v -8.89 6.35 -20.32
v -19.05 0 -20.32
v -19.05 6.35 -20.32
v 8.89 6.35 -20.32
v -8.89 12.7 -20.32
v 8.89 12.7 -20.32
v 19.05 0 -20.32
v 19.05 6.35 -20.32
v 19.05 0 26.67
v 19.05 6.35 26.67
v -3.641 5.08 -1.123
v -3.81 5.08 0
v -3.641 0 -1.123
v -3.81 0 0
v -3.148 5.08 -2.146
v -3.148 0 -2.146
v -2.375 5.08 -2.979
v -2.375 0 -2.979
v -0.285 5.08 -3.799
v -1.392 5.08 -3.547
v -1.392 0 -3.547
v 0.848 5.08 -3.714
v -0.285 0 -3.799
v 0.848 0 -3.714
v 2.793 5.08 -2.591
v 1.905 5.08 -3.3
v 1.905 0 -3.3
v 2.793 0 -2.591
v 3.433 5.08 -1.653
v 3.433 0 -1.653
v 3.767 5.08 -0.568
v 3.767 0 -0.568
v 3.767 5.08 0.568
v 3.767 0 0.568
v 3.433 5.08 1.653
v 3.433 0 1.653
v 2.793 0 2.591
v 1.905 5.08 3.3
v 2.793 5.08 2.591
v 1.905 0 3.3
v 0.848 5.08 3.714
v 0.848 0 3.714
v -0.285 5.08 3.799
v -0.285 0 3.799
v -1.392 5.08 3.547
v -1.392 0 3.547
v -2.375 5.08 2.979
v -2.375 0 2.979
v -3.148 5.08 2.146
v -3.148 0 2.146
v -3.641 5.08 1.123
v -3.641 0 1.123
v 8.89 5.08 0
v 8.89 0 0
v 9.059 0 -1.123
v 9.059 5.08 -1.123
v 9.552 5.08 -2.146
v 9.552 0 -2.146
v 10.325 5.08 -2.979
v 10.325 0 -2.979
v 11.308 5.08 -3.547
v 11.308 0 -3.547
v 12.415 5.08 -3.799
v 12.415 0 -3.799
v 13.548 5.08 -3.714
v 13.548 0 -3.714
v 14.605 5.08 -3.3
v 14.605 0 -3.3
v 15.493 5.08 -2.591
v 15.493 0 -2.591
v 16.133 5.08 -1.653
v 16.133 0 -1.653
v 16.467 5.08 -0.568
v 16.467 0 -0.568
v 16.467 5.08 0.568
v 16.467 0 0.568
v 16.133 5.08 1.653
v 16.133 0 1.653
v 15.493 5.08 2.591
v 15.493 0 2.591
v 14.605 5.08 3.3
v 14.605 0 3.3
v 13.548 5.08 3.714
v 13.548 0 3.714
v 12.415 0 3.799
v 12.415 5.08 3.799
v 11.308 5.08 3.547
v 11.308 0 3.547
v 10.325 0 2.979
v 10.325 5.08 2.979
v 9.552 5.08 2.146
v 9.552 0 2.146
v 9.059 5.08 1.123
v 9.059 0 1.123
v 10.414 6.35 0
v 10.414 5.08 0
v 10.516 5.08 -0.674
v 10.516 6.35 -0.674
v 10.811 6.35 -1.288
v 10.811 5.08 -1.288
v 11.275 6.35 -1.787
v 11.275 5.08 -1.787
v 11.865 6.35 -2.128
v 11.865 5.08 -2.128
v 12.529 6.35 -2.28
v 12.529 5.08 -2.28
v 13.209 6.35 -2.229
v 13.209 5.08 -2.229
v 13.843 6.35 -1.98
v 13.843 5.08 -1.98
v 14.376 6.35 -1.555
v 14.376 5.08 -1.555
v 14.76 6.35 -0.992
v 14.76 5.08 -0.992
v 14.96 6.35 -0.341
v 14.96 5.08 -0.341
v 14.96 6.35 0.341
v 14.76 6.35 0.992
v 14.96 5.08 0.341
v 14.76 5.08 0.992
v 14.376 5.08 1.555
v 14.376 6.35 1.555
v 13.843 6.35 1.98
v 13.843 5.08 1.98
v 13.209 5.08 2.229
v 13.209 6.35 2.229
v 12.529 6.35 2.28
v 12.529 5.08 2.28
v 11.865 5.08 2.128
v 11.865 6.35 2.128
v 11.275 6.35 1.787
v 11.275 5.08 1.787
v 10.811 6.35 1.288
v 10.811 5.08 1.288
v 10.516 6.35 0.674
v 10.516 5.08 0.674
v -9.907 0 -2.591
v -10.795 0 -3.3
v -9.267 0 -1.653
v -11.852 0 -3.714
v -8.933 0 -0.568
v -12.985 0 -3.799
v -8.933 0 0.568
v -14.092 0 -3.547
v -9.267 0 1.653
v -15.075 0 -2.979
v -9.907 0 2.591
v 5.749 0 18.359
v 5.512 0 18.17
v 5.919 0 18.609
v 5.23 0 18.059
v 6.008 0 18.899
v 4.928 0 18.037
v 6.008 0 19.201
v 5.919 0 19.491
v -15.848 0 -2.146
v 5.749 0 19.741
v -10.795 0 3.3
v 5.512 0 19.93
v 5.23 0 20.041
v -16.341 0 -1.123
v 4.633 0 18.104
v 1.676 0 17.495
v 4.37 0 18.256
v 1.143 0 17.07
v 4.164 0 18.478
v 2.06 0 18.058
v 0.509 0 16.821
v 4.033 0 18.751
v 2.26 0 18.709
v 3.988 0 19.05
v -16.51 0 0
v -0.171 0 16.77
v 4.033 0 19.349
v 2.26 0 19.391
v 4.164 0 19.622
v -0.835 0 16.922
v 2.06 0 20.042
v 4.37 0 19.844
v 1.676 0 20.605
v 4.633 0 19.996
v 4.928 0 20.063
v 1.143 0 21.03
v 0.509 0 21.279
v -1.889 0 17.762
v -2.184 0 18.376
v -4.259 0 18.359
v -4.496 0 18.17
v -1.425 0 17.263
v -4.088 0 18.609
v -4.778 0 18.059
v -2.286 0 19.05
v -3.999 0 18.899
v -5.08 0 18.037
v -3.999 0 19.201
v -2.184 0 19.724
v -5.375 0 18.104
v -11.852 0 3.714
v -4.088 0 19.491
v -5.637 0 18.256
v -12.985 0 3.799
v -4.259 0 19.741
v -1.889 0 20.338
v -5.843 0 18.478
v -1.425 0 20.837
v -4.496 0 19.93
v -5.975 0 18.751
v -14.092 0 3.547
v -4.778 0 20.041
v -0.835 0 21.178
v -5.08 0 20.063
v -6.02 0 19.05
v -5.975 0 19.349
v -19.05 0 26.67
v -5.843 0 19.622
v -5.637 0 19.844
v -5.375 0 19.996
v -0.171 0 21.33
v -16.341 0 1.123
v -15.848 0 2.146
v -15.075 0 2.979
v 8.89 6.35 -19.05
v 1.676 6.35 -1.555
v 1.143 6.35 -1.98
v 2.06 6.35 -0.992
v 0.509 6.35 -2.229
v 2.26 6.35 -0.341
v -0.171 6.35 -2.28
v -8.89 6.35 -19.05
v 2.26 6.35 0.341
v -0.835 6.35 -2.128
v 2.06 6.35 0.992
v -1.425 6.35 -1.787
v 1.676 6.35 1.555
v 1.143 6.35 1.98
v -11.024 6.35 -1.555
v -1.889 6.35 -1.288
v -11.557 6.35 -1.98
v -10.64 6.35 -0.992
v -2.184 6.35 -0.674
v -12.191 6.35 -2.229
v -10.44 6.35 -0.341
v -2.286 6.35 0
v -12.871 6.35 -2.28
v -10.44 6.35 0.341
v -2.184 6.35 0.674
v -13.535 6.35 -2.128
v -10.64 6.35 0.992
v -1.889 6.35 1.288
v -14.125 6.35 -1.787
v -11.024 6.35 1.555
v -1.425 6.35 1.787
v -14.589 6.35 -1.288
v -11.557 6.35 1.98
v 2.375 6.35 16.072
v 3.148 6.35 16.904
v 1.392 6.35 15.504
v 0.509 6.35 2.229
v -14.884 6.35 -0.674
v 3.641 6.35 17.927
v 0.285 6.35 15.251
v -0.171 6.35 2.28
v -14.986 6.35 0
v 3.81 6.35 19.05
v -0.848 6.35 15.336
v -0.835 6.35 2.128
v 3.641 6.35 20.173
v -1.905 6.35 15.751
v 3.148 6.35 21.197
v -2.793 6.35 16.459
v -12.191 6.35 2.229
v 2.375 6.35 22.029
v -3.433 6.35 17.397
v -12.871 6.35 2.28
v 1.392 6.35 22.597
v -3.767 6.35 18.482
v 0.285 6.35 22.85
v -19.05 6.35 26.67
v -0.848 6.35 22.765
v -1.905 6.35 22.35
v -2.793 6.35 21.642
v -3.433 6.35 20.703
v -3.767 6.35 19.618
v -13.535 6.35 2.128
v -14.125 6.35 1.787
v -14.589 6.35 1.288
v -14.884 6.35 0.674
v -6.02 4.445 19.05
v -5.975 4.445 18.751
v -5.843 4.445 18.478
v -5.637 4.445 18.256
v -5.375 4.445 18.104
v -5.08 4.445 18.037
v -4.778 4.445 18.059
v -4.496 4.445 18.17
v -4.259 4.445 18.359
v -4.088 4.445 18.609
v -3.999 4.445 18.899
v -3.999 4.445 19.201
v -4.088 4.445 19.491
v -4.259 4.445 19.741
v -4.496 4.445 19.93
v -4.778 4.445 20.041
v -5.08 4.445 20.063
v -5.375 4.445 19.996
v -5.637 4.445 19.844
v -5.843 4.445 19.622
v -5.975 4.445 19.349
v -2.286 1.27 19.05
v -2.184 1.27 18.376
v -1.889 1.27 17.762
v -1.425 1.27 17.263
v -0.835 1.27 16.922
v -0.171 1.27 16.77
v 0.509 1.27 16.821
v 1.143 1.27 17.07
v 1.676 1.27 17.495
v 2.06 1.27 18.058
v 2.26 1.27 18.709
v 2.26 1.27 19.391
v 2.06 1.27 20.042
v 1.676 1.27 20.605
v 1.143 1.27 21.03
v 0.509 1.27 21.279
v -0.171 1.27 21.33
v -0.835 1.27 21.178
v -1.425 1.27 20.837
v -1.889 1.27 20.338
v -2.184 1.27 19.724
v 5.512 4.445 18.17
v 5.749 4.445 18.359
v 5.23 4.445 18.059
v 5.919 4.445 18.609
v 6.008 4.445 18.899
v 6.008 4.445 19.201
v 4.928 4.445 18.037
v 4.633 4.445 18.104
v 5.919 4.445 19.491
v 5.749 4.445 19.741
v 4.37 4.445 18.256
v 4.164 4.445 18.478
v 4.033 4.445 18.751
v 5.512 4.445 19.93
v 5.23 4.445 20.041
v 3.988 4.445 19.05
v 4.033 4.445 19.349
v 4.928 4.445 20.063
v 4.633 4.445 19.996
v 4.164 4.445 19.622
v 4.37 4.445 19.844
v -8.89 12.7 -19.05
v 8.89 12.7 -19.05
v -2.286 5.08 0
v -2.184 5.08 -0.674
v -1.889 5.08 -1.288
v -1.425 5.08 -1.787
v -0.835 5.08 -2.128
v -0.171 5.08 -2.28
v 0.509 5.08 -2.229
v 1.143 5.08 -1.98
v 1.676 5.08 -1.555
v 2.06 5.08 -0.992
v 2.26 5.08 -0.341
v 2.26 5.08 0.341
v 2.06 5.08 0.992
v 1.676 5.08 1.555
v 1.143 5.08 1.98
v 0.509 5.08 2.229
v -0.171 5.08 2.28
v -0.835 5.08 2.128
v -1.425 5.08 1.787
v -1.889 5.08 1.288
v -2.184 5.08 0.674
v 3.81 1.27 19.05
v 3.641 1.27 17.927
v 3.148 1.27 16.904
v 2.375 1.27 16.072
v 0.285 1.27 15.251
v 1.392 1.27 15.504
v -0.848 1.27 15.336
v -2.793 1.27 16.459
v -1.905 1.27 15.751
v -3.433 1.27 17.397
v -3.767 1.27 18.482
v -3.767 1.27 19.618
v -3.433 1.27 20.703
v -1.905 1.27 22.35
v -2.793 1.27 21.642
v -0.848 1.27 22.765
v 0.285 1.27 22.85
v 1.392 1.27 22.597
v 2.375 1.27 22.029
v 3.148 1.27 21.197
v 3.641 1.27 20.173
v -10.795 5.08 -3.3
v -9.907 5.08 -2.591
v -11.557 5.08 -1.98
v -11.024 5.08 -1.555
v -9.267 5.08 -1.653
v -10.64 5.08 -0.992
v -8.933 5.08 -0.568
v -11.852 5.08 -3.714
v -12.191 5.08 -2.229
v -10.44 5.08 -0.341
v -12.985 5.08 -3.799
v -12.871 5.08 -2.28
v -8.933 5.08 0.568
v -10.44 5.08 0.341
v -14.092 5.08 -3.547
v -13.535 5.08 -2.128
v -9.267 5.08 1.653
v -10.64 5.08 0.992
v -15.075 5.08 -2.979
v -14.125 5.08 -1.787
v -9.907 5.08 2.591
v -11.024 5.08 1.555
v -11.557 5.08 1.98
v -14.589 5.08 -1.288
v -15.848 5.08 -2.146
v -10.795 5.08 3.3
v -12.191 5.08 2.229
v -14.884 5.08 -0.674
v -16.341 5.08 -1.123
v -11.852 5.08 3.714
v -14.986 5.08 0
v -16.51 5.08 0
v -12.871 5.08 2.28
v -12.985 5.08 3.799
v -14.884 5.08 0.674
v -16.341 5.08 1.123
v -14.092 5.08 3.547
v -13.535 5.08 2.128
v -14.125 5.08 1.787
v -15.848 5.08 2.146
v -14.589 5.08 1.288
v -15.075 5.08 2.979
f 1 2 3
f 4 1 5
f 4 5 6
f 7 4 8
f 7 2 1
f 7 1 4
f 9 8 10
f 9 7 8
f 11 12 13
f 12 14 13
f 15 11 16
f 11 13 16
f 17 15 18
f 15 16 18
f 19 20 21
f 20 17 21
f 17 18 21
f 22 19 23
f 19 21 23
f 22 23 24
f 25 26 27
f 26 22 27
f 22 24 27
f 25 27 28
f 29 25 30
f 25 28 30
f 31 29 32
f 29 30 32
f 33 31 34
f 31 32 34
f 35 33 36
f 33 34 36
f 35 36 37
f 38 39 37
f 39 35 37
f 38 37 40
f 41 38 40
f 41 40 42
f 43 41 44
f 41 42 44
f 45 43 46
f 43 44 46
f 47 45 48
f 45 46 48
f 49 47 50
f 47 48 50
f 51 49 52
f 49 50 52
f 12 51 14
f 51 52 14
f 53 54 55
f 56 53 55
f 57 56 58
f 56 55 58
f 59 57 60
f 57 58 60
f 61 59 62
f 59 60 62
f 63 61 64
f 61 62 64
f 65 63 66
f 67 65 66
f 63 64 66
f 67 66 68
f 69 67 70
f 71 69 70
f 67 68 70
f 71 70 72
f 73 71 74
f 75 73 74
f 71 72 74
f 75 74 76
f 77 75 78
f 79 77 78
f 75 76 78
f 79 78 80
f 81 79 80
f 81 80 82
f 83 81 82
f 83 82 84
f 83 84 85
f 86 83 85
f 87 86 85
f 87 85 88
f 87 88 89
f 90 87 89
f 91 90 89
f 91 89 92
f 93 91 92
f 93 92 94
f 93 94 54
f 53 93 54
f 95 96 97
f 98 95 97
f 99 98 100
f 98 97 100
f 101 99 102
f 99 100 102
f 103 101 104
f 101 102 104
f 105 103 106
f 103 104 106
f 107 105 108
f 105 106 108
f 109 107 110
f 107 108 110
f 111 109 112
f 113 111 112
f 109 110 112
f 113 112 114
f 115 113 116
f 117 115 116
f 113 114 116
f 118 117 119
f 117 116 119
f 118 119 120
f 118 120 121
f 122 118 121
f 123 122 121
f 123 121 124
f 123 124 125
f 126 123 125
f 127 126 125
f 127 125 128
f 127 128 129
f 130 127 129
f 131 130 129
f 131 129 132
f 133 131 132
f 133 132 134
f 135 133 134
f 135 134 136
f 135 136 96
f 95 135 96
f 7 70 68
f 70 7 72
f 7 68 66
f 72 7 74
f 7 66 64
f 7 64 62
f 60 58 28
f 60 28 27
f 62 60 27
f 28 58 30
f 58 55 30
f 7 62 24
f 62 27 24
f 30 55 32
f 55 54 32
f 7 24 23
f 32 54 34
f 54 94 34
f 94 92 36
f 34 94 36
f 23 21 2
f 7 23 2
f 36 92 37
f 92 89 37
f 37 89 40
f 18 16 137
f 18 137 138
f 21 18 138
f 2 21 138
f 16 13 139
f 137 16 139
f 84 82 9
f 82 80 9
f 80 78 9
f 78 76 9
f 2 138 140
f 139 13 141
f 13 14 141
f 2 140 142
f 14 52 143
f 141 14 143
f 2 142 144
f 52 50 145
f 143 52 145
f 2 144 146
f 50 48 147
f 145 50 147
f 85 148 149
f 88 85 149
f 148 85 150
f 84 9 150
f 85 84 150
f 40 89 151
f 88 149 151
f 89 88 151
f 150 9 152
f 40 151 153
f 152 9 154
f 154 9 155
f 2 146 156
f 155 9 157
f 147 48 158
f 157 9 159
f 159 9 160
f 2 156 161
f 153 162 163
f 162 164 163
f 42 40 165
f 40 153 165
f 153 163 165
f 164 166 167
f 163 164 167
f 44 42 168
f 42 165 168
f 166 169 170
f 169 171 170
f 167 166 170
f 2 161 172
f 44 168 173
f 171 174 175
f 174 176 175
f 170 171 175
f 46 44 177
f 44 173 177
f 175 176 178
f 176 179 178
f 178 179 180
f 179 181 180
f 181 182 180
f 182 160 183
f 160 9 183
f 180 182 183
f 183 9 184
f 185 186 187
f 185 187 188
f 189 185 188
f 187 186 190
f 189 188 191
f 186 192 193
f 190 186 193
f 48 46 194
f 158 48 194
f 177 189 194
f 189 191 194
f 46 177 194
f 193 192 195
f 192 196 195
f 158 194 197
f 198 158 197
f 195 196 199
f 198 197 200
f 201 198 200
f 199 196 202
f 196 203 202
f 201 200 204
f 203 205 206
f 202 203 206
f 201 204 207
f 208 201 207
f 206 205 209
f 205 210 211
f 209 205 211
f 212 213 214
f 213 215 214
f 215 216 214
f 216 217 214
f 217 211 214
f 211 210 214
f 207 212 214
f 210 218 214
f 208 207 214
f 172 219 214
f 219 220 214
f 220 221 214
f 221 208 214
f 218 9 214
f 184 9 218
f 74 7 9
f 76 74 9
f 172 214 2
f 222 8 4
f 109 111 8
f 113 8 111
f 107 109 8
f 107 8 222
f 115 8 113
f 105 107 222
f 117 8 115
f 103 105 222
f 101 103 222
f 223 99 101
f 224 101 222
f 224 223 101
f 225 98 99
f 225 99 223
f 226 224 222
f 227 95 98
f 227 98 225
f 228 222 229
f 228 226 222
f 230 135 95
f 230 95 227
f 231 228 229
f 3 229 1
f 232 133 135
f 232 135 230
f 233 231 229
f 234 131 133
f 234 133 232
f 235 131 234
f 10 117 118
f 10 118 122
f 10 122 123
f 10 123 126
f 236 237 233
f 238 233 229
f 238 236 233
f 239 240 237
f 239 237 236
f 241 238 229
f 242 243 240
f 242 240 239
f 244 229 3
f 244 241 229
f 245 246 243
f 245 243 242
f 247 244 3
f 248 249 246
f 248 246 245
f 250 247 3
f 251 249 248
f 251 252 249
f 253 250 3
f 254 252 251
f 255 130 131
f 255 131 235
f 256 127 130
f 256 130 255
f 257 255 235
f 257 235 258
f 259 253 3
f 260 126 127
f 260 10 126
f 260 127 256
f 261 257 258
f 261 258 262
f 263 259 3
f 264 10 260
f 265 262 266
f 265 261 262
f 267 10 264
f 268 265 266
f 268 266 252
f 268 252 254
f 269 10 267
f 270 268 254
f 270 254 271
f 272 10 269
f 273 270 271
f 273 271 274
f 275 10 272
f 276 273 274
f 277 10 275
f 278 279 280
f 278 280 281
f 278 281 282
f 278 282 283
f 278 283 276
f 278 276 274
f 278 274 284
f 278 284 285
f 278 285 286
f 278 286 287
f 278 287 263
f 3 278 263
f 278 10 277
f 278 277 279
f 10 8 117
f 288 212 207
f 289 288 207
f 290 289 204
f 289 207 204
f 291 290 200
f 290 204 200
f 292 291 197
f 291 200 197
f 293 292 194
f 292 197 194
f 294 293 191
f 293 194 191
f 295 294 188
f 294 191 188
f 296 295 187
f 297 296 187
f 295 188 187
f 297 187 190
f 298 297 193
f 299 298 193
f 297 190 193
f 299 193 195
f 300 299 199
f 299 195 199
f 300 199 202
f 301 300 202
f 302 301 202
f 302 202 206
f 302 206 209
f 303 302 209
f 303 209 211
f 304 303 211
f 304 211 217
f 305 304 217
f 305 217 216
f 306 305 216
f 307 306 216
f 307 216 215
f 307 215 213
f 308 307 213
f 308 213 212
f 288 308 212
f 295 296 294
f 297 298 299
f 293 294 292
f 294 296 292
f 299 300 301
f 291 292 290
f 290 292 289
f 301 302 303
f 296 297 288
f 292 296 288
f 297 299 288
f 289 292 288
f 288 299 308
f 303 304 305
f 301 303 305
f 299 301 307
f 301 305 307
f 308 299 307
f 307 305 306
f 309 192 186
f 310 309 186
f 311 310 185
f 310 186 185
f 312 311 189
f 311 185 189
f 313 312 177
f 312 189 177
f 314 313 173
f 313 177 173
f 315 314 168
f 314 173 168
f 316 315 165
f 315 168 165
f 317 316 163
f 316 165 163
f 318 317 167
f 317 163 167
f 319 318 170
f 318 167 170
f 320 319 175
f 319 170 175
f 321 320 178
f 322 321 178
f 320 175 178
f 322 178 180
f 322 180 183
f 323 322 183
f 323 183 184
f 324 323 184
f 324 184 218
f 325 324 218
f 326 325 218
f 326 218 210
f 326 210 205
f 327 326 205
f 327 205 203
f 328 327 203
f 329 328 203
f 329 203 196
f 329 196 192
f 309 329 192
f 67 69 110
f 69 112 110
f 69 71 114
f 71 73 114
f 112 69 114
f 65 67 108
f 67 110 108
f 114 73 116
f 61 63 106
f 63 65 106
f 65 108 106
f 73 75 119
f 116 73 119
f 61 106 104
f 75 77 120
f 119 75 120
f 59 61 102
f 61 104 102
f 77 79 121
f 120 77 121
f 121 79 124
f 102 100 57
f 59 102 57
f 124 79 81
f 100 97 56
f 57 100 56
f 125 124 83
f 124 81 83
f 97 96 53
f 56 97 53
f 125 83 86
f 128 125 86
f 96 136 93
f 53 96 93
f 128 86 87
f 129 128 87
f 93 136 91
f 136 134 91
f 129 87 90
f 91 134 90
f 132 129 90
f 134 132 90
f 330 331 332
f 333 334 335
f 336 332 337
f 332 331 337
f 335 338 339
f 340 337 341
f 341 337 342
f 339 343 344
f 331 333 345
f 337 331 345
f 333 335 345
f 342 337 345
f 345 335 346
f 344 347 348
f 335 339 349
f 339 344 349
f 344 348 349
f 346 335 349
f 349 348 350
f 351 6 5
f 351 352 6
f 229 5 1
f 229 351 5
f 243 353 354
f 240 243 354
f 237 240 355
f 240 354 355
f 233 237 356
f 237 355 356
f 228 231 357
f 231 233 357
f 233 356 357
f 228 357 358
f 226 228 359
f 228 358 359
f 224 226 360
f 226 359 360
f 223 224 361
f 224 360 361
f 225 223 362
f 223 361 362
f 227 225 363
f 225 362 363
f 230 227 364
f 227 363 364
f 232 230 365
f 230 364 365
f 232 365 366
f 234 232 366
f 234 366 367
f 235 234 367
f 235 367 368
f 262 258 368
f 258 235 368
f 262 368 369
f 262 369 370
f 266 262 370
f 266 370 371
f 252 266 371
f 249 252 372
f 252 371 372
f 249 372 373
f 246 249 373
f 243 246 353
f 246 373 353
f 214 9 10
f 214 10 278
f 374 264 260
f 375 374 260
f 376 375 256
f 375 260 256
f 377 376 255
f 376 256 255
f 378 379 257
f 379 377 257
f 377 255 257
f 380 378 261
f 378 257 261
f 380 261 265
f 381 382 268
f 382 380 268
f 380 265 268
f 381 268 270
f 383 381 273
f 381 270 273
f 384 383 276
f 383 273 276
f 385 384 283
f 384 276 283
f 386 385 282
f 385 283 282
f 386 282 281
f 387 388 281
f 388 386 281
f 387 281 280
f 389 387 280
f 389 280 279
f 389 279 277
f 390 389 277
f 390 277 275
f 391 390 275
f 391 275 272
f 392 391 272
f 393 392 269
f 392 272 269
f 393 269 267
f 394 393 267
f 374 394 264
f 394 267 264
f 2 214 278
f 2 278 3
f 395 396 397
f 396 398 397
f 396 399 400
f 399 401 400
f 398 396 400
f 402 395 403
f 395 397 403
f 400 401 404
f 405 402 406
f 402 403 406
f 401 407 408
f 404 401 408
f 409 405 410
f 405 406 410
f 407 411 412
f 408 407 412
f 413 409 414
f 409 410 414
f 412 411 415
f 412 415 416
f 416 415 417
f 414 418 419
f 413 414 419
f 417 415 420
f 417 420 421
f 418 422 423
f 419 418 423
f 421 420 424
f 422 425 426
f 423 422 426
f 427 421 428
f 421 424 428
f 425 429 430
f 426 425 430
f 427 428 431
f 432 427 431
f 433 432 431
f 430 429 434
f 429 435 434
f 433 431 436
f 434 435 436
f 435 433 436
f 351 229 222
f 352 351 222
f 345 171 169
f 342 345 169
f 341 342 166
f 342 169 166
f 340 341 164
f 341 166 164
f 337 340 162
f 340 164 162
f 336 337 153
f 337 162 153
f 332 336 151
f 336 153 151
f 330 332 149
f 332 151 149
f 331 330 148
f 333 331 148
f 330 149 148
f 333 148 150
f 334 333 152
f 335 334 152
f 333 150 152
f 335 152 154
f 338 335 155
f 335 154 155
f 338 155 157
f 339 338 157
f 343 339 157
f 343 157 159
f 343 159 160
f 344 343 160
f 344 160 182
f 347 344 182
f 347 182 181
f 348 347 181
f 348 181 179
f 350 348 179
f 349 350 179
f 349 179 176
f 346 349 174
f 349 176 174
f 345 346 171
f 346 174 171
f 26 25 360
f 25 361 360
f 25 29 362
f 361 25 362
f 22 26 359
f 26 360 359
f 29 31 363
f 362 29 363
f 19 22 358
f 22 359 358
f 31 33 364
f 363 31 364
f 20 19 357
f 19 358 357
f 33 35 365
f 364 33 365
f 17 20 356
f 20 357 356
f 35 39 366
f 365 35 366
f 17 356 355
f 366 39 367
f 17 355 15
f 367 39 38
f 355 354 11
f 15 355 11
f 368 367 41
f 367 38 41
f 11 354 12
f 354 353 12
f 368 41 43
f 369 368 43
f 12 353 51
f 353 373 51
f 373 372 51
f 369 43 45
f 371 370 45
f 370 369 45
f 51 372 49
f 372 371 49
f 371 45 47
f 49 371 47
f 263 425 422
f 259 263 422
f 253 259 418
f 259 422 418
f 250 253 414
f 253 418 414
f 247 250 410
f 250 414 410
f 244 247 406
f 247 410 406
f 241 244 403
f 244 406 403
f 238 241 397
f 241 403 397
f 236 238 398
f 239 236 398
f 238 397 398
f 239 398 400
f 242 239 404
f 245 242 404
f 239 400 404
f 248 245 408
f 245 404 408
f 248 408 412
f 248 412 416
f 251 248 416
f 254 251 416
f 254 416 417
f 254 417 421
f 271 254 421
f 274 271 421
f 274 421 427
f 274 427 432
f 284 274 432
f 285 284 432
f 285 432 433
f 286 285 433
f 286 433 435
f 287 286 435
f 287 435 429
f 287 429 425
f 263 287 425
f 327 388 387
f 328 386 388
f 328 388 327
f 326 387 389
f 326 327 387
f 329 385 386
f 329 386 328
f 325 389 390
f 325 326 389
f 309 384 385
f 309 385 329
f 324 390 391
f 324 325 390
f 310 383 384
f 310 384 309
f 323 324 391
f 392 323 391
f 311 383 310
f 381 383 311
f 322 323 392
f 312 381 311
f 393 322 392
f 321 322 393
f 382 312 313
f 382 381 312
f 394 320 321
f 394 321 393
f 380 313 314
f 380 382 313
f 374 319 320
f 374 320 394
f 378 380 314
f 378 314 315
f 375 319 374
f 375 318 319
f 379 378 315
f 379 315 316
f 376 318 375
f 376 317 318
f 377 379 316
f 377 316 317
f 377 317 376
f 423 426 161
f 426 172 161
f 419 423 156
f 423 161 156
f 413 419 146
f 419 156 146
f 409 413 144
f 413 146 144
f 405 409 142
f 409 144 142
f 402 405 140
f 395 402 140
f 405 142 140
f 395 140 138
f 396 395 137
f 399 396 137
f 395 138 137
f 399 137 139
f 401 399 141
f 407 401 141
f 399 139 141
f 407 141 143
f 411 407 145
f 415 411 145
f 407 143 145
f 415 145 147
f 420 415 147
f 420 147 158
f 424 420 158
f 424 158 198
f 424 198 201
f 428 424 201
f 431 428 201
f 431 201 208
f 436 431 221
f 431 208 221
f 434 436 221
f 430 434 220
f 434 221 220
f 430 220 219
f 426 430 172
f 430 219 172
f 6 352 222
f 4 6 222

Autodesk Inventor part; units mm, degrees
ref_plane "YZ Plane" through (0, 0, 0) normal (1, 0, 0) x (0, 1, 0)
ref_plane "XZ Plane" through (0, 0, 0) normal (0, 1, 0) x (-1, 0, 0)
ref_plane "XY Plane" through (0, 0, 0) normal (0, 0, 1) x (1, 0, 0)
sketch "Sketch1" plane through (0, 0, 0) normal (0, 1, 0) x (-1, 0, 0)
  line L0 (-12.7, 19.05) -> (12.7, 19.05)
  line L1 (12.7, 19.05) -> (12.7, -19.05)
  line L2 (12.7, -19.05) -> (-12.7, -19.05)
  line L3 (-12.7, -19.05) -> (-12.7, 19.05)
  line L4 (-12.7, 19.05) -> (12.7, -19.05) construction
  line L5 (12.7, 19.05) -> (-12.7, -19.05) construction
  circle A0 centre (0, 0) radius 2.286
  line L6 (12.7, 19.05) -> (-12.7, 19.05)
  line L7 (-12.7, 19.05) -> (-12.7, 34.29)
  line L8 (-12.7, 34.29) -> (12.7, 34.29)
  line L9 (12.7, 34.29) -> (12.7, 19.05)
  line L10 (-19.05, 19.05) -> (19.05, 19.05)
  line L11 (19.05, 19.05) -> (19.05, -19.05)
  line L12 (19.05, -19.05) -> (-19.05, -19.05)
  line L13 (-19.05, -19.05) -> (-19.05, 19.05)
  line L14 (-19.05, 19.05) -> (19.05, -19.05) construction
  line L15 (19.05, 19.05) -> (-19.05, -19.05) construction
  circle A1 centre (12.7, 0) radius 2.286
  circle A2 centre (-12.7, 0) radius 2.286
  line L16 (19.05, 19.05) -> (-19.05, 19.05)
  line L17 (-19.05, 19.05) -> (-19.05, 34.29)
  line L18 (-19.05, 34.29) -> (19.05, 34.29)
  line L19 (19.05, 34.29) -> (19.05, 19.05)
  circle A3 centre (0, 26.67) radius 2.286
  line L20 (-19.05, -19.05) -> (19.05, -19.05)
  line L21 (19.05, -19.05) -> (19.05, -20.32)
  line L22 (19.05, -20.32) -> (-19.05, -20.32)
  line L23 (-19.05, -20.32) -> (-19.05, -19.05)
  circle A4 centre (0, 0) radius 3.81
  circle A5 centre (-12.7, 0) radius 3.81
  circle A6 centre (12.7, 0) radius 3.81
  line L24 (0, 26.67) -> (-5.0038, 26.67)
  line L25 (-5.0038, 26.67) -> (0, 26.67)
  line L26 (0, 26.67) -> (5.0038, 26.67)
  circle A7 centre (5.0038, 26.67) radius 1.016
  circle A8 centre (-5.0038, 26.67) radius 1.016
  circle A9 centre (0, 19.05) radius 2.286
  circle A10 centre (-5.0038, 19.05) radius 1.016
  circle A11 centre (5.0038, 19.05) radius 1.016
  line L27 (-19.05, 26.67) -> (19.05, 26.67)
  point P0 (12.7, 34.29)
  dimension "d0" = 38.1
  dimension "d1" = 25.4
  dimension "d2" = 4.572
  dimension "d3" = 15.24
  dimension "d4" = 38.1
  dimension "d5" = 4.572
  dimension "d6" = 4.572
  dimension "d7" = 4.572
  dimension "d10" = 1.27
  dimension "d13" = 15.24
  dimension "d14" = 7.62
  dimension "d15" = 7.62
  dimension "d16" = 7.62
  dimension "d22" = 5.0038
  dimension "d23" = 5.0038
  dimension "d24" = 2.032
  dimension "d25" = 2.032
  dimension "d28" = 4.572
  dimension "d29" = 2.032
extrude "Extrusion1" add sketch "Sketch1" along normal blind 6.35 contours A11 L0 A9 A10 L7 L27 A8 L24 A3 L26 A7 L9 | A11 L0 | L0 A11 | L0 L1 A6 L2 L3 A5 A10 A9 A11 | L10 L11 L12 L1 A6 | L9 L27 L19 L10 | A6 L1 A1 | L1 A1 A6 | A7 L26 L27 | A10 L0 | L0 A10 | L12 L13 L10 L3 A5 | L7 L10 L17 L27 | A3 L24 L26 | A5 L3 A2 | L3 A2 A5 | L27 L24 A8 | A4 picked at (4.3363, 26.589) picked at (-1.5019, 26.4876) picked at (-5.6713, 26.589)
extrude "Extrusion2" add sketch "Sketch1" along normal blind 12.7 contours L21 L22 L23 L12 L2
extrude "Extrusion3" cut sketch "Sketch1" along normal blind 5.08 contours A6 L1 A1 | L1 A1 A6 | A5 L3 A2 | L3 A2 A5 | A4
sketch "Sketch2" plane through (0, 6.35, 0) normal (0, 1, 0) x (1, 0, 0)
  circle A0 centre (0, -26.67) radius 2.286 projected
  circle A1 centre (0, -26.67) radius 3.81
  circle A2 centre (0, -19.0503) radius 3.81
  point P0 (0, 0)
  point P1 (0.035, -22.8602)
  point P2 (-0.035, -22.8602)
  dimension "d19" = 7.62
extrude "Extrusion4" cut sketch "Sketch2" against normal blind 5.08 contours A2
sketch "Sketch3" plane through (0, 0, 0) normal (0, -1, 0) x (1, 0, 0)
  point P0 (0, 0)
extrude "Extrusion5" cut sketch "Sketch1" along normal blind 4.445 contours A11 L0 | L0 A11 | A10 L0 | L0 A10
sketch "Sketch4" plane through (19.05, 0, -20.32) normal (0, 0, -1) x (-1, 0, 0)
  point P0 (19.05, 0)
sketch "Sketch5" plane through (-19.05, 6.35, -19.05) normal (0, 0, 1) x (1, 0, 0)
  line L0 (38.1, 6.35) -> (0, 6.35) projected
  line L1 (0, 6.35) -> (10.16, 6.35)
  line L2 (10.16, 6.35) -> (10.16, 0)
  line L3 (10.16, 0) -> (0, 0)
  line L4 (0, 0) -> (0, 6.35)
  line L5 (0, 0) -> (38.1, 0) projected
  line L6 (38.1, 6.35) -> (27.94, 6.35)
  line L7 (27.94, 6.35) -> (27.94, 0)
  line L8 (27.94, 0) -> (38.1, 0)
  line L9 (38.1, 0) -> (38.1, 6.35)
  point P0 (19.05, -6.35)
  dimension "d30" = 10.16
  dimension "d31" = 10.16
  dimension "d32" = 6.35
extrude "Extrusion6" cut sketch "Sketch5" against normal blind 25.4 contours L9 L5 L7 L0 | L2 L3 L4 L0
properties part number "BeamsplitterMounttoPolarisPinAdapterV3"
